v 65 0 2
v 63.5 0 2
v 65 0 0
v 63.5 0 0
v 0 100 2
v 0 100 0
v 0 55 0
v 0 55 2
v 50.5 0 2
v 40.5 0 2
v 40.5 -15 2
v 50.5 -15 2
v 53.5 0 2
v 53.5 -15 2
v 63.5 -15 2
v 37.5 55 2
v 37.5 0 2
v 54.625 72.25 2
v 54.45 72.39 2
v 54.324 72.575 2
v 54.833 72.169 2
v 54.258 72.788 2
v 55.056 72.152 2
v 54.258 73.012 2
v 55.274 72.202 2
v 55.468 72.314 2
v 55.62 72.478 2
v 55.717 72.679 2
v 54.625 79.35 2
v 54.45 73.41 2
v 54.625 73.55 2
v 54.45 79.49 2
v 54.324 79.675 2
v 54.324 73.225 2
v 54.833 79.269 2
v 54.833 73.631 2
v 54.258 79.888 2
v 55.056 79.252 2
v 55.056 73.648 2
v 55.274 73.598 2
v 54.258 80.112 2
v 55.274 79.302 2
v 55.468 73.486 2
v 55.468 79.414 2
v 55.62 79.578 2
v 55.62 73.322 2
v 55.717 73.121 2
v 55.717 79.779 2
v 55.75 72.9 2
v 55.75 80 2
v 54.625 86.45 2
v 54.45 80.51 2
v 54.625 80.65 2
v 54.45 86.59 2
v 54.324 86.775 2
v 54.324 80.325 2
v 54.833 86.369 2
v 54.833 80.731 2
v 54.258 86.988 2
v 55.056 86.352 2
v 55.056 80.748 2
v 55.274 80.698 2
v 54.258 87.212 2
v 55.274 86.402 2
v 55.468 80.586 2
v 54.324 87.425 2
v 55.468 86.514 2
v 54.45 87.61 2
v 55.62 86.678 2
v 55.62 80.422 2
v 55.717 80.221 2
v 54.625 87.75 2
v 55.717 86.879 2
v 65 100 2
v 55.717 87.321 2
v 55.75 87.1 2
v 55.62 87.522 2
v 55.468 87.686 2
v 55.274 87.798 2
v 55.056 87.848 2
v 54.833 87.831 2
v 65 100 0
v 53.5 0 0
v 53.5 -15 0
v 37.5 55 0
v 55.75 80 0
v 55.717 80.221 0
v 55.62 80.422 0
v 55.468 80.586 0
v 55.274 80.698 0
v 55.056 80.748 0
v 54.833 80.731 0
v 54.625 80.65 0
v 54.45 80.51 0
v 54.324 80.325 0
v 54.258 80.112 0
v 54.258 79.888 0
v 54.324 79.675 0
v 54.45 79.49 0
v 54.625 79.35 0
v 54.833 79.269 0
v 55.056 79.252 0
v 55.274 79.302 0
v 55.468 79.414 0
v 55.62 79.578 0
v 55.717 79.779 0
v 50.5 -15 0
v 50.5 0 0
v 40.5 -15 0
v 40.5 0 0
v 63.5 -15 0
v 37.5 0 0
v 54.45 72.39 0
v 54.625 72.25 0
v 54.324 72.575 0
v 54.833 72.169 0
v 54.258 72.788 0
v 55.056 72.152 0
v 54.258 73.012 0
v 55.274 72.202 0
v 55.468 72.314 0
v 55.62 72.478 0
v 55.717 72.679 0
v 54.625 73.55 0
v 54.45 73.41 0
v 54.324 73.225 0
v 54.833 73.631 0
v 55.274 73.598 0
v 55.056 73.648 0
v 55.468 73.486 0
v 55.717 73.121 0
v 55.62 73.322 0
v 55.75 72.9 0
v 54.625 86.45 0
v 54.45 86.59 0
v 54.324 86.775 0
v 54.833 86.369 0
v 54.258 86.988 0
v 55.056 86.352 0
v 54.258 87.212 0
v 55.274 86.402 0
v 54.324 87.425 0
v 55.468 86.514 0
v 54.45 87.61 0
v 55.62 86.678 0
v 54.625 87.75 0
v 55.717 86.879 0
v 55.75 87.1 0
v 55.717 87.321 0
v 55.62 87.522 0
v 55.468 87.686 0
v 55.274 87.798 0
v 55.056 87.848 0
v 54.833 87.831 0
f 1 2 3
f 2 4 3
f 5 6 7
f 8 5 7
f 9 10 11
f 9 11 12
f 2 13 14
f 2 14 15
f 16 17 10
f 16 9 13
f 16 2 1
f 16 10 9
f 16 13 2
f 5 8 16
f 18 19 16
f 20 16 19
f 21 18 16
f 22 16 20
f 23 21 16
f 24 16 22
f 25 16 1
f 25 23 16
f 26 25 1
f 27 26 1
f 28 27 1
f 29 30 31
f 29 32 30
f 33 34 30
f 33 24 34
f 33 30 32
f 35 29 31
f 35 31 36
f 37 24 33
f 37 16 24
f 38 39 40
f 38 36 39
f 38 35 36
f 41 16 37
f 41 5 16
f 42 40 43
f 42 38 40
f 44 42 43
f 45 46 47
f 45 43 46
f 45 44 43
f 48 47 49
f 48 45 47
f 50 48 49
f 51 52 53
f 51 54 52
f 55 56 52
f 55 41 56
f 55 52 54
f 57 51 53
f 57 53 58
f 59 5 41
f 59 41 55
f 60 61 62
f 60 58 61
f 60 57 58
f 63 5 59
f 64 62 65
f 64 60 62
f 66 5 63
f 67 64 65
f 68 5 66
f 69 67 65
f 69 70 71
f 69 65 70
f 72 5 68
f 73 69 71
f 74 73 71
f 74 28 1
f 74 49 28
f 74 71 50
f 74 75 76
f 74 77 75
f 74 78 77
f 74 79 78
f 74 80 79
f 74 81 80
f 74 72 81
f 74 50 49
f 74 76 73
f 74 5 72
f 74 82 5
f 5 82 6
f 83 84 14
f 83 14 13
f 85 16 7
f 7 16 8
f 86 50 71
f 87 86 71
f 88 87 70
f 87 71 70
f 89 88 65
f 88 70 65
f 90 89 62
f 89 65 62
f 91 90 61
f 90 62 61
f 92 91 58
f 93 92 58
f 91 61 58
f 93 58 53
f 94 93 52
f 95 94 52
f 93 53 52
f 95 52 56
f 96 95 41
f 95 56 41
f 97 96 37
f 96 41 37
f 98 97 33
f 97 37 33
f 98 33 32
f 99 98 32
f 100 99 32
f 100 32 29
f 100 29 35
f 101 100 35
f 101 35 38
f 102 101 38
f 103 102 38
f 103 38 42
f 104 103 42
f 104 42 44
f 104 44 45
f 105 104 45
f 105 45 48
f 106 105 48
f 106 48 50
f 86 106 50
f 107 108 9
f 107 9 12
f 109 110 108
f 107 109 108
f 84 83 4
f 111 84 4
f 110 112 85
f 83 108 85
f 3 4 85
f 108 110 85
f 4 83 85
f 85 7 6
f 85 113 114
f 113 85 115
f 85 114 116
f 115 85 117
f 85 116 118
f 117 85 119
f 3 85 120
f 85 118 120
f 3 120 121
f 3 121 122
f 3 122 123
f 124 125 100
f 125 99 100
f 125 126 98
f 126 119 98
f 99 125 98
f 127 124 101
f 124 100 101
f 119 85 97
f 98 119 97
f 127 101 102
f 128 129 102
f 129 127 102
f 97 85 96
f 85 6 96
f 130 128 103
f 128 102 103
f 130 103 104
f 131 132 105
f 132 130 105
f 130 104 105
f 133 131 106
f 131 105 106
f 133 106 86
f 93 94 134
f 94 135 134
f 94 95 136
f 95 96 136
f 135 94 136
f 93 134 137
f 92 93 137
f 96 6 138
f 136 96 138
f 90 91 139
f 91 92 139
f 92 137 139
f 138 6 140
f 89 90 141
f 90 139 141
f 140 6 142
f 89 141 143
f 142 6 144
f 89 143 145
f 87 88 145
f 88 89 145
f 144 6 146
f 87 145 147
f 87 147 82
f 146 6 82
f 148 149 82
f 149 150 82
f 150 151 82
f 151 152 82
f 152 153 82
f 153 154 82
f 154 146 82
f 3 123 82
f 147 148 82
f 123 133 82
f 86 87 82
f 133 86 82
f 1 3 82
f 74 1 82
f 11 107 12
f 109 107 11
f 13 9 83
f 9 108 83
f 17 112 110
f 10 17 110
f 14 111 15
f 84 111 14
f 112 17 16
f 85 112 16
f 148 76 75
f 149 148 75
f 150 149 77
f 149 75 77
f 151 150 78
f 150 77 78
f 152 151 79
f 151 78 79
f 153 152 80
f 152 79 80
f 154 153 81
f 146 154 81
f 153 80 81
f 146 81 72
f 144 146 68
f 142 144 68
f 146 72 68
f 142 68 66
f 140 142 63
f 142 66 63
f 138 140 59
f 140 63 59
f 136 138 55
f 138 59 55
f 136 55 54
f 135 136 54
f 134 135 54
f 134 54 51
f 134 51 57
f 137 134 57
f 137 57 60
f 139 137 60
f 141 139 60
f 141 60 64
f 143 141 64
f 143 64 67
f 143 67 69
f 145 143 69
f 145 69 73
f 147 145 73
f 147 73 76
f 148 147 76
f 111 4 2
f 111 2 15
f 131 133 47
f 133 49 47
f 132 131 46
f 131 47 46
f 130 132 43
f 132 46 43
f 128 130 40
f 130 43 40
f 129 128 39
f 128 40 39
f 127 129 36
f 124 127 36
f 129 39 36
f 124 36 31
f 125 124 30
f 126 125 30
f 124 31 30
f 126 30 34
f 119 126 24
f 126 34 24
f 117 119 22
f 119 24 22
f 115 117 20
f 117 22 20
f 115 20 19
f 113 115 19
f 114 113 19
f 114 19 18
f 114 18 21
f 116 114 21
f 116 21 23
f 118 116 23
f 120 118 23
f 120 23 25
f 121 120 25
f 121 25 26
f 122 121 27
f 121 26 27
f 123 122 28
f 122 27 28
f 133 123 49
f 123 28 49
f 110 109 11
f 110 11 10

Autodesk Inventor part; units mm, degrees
ref_plane "YZ Plane" through (0, 0, 0) normal (1, 0, 0) x (0, 1, 0)
ref_plane "XZ Plane" through (0, 0, 0) normal (0, 1, 0) x (-1, 0, 0)
ref_plane "XY Plane" through (0, 0, 0) normal (0, 0, 1) x (1, 0, 0)
sketch "Sketch4" plane through (0, 0, 0) normal (0, 0, 1) x (1, 0, 0)
  line L0 (0, 0) -> (65, 0)
  line L1 (65, 0) -> (65, 100)
  line L2 (65, 100) -> (0, 100)
  line L3 (0, 100) -> (0, 0)
  line L4 (1.5, 0) -> (11.5, 0)
  line L5 (11.5, 0) -> (11.5, -15)
  line L6 (11.5, -15) -> (1.5, -15)
  line L7 (1.5, -15) -> (1.5, 0)
  line L8 (14.5, 0) -> (24.5, 0)
  line L9 (24.5, 0) -> (24.5, -15)
  line L10 (24.5, -15) -> (14.5, -15)
  line L11 (14.5, -15) -> (14.5, 0)
  line L12 (32.5, 0) -> (42.5, 0)
  line L13 (27.5, 0) -> (37.5, 0)
  line L14 (37.5, 0) -> (37.5, -15)
  line L15 (37.5, -15) -> (27.5, -15)
  line L16 (27.5, -15) -> (27.5, 0)
  line L17 (40.5, 0) -> (50.5, 0)
  line L18 (50.5, 0) -> (50.5, -15)
  line L19 (50.5, -15) -> (40.5, -15)
  line L20 (40.5, -15) -> (40.5, 0)
  line L21 (53.5, 0) -> (63.5, 0)
  line L22 (63.5, 0) -> (63.5, -15)
  line L23 (63.5, -15) -> (53.5, -15)
  line L24 (53.5, -15) -> (53.5, 0)
  dimension "d39" = 65
  dimension "d40" = 100
  dimension "d41" = 10
  dimension "d42" = 15
  dimension "d43" = 1.5
  dimension "d44" = 10
  dimension "d45" = 15
  dimension "d47" = 3
  dimension "d49" = 10
  dimension "d50" = 10
  dimension "d51" = 15
  dimension "d52" = 3
  dimension "d53" = 3
  dimension "d54" = 10
  dimension "d55" = 15
  dimension "d56" = 3
extrude "Extrusion4" add sketch "Sketch4" along normal blind 2
sketch "Sketch5" plane through (0, 0, 2) normal (0, 0, 1) x (1, 0, 0)
  circle A0 centre (55, 80) radius 0.75
  line L0 (65, 100) -> (0, 100) projected
  line L1 (65, 0) -> (65, 100) projected
  circle A1 centre (55, 72.9) radius 0.75
  circle A2 centre (55, 87.1) radius 0.75
  point P0 (0, 0)
  dimension "d59" = 1.5
  dimension "d60" = 20
  dimension "d61" = 10
  dimension "d62" = 1.5
  dimension "d63" = 7.1
  dimension "d64" = 1.5
  dimension "d65" = 7.1
extrude "Extrusion5" cut sketch "Sketch5" against normal blind 2
sketch "Sketch6" plane through (0, 0, 2) normal (0, 0, 1) x (1, 0, 0)
  line L0 (0, -15) -> (37.5, -15)
  line L1 (37.5, -15) -> (37.5, 55)
  line L2 (37.5, 55) -> (0, 55)
  line L3 (0, 55) -> (0, -15)
  point P0 (0, 0)
  dimension "d68" = 37.5
  dimension "d69" = 70
extrude "Extrusion6" cut sketch "Sketch6" against normal blind 2
properties part number "Arm"
